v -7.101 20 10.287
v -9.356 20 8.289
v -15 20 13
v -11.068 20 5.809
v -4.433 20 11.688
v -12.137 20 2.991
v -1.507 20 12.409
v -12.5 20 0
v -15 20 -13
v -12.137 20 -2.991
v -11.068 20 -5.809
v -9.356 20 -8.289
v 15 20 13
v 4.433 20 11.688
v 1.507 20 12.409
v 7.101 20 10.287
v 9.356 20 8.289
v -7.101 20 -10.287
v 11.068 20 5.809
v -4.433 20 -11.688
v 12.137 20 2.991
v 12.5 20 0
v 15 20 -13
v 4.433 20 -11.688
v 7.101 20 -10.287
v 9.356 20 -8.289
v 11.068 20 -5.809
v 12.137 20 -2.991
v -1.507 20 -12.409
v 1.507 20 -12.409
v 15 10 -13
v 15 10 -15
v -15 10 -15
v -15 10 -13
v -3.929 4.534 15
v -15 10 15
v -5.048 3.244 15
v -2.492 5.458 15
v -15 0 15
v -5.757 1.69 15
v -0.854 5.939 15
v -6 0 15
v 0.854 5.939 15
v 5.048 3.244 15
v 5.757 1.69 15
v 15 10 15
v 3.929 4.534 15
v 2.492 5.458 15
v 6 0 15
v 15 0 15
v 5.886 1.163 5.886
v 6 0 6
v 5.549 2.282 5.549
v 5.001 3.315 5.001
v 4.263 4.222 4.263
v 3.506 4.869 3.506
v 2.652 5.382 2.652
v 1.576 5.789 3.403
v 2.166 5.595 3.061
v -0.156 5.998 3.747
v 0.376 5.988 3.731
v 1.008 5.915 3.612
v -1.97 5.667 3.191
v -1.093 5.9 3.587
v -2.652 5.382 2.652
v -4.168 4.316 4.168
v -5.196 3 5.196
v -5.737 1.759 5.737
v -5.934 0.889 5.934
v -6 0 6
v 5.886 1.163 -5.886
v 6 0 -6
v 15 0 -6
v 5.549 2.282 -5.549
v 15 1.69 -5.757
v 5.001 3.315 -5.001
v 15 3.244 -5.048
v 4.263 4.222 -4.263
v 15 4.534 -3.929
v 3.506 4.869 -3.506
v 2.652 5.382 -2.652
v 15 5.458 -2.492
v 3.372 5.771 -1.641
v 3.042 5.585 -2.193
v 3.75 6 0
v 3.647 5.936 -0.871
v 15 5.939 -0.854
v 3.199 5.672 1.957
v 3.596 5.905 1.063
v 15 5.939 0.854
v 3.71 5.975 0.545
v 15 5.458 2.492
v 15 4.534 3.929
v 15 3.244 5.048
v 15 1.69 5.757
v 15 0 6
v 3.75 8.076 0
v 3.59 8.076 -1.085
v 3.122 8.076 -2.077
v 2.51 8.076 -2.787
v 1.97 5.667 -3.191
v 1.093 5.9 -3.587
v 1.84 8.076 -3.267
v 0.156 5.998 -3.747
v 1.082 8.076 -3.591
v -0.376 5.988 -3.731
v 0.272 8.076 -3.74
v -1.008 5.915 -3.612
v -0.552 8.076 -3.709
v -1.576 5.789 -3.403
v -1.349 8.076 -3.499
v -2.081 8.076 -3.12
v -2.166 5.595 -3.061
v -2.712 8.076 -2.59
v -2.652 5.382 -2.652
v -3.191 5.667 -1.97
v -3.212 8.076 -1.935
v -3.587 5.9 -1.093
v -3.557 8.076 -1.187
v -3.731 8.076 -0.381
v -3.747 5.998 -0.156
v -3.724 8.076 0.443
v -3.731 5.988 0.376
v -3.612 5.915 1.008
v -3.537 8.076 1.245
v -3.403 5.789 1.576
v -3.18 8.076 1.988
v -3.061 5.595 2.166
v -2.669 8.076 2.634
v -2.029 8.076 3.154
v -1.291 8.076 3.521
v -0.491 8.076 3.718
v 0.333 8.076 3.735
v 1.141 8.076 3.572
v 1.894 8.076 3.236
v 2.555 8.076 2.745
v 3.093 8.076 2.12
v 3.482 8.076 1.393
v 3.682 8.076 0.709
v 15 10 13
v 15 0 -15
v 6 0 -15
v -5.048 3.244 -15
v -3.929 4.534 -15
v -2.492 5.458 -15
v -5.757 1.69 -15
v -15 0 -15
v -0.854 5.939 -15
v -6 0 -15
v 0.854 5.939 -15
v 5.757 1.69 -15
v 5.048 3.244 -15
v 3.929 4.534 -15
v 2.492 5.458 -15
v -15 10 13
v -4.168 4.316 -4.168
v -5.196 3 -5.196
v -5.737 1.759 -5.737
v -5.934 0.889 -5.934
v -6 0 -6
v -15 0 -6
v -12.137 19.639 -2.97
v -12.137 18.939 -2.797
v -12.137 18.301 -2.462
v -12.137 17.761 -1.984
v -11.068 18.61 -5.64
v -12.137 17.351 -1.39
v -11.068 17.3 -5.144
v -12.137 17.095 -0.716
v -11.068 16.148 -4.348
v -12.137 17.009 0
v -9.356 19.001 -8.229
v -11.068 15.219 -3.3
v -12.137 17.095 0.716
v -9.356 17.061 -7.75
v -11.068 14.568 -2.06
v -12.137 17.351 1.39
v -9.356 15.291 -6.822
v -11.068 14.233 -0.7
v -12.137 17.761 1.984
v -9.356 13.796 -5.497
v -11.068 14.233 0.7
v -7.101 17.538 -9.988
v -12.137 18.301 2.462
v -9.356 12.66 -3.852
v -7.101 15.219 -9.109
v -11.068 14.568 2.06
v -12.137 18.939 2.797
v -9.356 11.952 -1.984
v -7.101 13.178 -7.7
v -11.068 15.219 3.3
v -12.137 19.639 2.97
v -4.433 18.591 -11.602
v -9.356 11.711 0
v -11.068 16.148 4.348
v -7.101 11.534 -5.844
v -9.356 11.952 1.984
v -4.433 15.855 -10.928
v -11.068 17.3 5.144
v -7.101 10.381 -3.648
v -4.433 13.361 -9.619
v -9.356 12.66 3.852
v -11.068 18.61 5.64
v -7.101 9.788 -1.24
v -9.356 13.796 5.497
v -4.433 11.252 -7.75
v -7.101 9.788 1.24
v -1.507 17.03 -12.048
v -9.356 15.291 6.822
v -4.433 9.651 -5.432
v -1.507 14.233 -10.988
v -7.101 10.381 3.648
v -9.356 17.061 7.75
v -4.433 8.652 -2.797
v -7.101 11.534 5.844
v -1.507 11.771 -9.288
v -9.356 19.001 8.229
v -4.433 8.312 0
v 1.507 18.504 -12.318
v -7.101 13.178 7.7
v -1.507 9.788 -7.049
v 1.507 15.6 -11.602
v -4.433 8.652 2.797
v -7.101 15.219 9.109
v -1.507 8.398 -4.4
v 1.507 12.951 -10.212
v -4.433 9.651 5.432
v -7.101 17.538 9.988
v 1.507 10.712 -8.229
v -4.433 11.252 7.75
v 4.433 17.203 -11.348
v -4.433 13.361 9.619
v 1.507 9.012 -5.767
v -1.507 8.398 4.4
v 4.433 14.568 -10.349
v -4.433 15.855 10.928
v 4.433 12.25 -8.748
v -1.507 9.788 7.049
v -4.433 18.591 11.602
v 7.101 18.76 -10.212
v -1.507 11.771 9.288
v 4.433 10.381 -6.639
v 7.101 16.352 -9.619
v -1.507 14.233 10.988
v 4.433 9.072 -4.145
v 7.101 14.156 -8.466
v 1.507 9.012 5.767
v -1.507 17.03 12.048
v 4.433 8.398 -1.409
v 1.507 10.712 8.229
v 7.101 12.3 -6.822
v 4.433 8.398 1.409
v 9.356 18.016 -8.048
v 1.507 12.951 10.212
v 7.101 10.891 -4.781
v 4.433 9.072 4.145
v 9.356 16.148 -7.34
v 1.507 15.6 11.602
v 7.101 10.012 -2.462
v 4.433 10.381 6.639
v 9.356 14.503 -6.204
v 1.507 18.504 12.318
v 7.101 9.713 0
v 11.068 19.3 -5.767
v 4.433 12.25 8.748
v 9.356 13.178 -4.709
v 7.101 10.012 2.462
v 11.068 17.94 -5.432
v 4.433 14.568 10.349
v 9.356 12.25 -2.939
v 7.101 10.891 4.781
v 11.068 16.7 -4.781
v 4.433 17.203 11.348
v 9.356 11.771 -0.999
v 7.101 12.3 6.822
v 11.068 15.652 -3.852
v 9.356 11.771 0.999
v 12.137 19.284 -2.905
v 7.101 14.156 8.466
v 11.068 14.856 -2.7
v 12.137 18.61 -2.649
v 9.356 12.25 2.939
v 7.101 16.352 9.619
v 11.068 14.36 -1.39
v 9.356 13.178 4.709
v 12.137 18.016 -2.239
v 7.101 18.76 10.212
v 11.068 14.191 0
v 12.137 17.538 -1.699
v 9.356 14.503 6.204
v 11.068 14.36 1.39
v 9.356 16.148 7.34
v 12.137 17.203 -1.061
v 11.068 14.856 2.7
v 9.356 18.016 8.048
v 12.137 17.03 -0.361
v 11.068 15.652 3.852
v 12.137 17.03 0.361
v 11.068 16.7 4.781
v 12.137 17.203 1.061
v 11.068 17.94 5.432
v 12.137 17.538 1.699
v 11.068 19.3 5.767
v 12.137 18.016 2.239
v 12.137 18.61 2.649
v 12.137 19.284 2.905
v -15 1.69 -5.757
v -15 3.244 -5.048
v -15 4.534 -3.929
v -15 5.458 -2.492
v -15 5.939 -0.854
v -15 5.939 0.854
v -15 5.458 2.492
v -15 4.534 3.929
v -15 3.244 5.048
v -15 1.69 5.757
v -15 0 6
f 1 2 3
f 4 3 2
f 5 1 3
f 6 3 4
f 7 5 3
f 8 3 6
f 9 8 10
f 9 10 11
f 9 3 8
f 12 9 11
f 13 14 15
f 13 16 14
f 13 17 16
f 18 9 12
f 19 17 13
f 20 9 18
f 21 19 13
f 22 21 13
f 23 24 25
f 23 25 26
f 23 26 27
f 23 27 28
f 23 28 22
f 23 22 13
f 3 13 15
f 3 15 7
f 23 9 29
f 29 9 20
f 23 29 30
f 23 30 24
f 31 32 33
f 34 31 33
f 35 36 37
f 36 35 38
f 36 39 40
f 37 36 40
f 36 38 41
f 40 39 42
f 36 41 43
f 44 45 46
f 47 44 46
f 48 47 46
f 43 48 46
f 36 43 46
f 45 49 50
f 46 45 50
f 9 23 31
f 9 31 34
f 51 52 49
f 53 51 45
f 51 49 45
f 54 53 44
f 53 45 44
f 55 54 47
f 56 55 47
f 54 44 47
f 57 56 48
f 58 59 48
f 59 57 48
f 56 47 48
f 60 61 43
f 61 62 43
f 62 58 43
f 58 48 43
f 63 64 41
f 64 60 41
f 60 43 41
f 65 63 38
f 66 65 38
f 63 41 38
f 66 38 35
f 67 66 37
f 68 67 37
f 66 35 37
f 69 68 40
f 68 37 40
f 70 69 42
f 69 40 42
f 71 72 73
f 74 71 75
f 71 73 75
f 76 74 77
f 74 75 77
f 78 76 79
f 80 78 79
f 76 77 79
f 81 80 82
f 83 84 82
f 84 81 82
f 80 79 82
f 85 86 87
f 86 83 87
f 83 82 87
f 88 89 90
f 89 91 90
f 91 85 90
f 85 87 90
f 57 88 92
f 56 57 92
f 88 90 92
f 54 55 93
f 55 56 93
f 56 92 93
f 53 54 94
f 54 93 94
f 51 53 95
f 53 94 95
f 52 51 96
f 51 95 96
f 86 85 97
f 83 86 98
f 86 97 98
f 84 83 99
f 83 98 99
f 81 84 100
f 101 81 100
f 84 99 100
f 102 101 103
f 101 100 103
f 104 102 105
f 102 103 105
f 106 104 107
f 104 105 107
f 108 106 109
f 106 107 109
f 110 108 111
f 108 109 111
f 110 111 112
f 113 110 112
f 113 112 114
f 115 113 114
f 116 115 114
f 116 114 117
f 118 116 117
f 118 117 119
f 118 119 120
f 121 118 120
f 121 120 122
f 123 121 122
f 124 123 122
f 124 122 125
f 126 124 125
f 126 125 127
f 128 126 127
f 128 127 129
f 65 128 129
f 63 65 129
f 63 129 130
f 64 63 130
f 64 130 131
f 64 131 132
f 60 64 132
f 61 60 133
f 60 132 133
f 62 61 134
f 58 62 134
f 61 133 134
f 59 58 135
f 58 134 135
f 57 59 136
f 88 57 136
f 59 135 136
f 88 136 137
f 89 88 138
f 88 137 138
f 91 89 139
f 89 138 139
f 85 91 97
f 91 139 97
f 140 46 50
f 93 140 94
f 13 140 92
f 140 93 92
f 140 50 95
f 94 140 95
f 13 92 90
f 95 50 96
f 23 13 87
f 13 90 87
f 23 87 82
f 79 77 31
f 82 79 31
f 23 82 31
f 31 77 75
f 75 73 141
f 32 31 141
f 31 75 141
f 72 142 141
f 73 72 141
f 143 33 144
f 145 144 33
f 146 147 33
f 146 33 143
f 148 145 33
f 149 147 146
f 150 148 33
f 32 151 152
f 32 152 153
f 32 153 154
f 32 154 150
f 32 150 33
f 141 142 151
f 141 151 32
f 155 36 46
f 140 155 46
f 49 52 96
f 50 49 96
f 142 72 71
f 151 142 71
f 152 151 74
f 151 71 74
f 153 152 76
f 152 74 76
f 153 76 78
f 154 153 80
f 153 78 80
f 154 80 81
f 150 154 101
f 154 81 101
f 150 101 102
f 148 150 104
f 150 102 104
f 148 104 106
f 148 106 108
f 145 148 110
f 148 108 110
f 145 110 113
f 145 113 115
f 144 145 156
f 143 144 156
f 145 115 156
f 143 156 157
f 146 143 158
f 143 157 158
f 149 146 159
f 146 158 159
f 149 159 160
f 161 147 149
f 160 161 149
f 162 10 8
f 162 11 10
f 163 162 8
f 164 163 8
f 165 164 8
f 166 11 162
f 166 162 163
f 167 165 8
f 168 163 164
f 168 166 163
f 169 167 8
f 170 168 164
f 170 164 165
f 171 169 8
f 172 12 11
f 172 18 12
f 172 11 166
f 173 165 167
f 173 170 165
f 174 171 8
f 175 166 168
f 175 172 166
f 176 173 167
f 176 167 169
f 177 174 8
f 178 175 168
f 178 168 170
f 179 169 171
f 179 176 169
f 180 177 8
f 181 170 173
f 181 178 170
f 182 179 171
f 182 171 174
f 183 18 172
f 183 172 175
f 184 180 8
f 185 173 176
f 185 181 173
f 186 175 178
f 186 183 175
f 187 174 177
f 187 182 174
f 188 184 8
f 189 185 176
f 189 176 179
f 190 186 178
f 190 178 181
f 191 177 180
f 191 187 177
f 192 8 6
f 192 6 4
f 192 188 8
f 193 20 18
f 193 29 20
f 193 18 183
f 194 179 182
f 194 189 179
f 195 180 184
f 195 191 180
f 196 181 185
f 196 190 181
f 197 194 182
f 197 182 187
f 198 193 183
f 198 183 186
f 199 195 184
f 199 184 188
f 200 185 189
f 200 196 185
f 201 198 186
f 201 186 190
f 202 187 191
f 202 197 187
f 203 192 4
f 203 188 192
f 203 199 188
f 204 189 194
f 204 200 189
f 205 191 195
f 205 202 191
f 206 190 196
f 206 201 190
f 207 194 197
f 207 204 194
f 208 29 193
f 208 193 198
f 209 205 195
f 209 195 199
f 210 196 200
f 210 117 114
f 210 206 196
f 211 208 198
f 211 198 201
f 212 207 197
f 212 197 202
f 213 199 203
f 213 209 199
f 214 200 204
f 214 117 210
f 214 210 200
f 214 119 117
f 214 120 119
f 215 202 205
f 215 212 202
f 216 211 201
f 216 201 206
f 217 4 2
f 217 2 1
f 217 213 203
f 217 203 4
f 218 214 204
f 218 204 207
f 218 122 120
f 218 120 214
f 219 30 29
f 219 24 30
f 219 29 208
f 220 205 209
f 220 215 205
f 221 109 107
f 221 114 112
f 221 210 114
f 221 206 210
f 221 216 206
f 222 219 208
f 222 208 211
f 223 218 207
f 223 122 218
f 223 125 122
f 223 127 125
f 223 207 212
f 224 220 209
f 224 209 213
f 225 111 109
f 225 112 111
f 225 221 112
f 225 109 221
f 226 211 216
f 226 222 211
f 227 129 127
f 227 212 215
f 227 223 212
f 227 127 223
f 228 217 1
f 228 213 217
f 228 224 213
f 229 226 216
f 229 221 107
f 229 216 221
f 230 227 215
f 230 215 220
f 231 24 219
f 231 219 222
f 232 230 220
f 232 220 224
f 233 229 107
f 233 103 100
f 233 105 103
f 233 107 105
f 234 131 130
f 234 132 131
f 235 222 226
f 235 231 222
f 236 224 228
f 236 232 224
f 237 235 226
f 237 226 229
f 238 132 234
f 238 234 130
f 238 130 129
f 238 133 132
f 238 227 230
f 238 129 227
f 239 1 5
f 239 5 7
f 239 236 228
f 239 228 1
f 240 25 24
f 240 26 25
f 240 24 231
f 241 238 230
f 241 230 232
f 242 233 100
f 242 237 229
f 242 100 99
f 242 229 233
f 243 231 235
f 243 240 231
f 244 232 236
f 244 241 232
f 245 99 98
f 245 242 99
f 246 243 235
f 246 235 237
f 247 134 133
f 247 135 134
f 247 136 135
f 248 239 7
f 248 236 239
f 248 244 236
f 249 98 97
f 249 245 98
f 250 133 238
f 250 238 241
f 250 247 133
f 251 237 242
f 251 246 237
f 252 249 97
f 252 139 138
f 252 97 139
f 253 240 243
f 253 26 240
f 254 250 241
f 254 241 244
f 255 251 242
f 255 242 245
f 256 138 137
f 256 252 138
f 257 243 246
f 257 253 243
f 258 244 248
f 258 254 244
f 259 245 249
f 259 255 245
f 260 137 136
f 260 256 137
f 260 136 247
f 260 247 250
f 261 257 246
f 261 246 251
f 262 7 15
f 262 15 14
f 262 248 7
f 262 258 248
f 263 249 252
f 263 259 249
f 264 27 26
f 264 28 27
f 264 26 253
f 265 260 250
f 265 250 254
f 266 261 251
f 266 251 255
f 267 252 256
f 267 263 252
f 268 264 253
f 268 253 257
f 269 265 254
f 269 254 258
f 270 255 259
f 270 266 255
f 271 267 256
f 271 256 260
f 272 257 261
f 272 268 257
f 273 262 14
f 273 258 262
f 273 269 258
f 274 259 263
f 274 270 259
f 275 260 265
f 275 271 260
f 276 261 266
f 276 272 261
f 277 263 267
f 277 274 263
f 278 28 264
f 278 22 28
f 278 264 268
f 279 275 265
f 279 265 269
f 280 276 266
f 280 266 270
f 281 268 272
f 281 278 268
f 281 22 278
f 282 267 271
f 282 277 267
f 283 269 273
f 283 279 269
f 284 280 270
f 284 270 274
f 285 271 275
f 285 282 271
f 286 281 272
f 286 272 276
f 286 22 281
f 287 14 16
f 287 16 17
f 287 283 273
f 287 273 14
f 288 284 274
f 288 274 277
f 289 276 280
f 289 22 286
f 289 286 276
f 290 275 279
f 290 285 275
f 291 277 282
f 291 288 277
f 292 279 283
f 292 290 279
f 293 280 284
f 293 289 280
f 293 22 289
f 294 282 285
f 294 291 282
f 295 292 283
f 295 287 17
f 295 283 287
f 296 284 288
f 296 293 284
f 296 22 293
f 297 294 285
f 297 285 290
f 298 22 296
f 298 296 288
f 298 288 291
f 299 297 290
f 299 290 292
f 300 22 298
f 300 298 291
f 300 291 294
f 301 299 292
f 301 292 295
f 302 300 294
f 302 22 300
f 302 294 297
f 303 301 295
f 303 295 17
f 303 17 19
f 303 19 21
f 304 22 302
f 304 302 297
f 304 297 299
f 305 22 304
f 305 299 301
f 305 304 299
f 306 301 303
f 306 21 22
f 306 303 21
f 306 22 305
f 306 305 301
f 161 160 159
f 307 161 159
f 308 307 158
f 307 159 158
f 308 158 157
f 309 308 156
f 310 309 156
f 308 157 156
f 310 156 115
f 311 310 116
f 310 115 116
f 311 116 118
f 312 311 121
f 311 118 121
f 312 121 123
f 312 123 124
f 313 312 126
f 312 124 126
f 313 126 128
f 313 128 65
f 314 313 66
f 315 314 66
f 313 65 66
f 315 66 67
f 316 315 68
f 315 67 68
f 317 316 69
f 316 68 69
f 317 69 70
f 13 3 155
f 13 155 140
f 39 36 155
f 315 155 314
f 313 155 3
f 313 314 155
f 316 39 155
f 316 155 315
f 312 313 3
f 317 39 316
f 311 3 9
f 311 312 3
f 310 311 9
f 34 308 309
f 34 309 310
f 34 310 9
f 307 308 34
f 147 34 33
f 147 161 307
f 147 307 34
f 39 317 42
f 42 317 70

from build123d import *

# Parameters (mm, degrees)
SKETCH2_W               = 30
SKETCH2_H               = 30
BOSS_EXTRUDE1_DEPTH     = 20
SKETCH3_R               = 6
CUT_EXTRUDE2_DEPTH      = 1
CUT_EXTRUDE2_DEPTH_BACK = 31
SKETCH4_R               = 6
CUT_EXTRUDE3_DEPTH      = 1
CUT_EXTRUDE3_DEPTH_BACK = 31
SKETCH7_R               = 3.75
CUT_EXTRUDE4_DEPTH      = 21
SKETCH8_W               = 30
SKETCH8_H               = 10
CUT_EXTRUDE6_DEPTH      = 2
SKETCH9_W               = 30
SKETCH9_H               = 10
CUT_EXTRUDE7_DEPTH      = 2


with BuildPart() as part:
    # Sketch2 → Boss-Extrude1 (new body)
    with BuildSketch(Plane(origin=(0, 0, 0), x_dir=(1, 0, 0), z_dir=(0, 1, 0))):
        Rectangle(SKETCH2_W, SKETCH2_H)
    extrude(amount=BOSS_EXTRUDE1_DEPTH)

    # Sketch3 → Cut-Extrude2 (cut, two sides)
    with BuildSketch(Plane.XY.offset(15)) as cut_extrude2_sk:
        Circle(SKETCH3_R)
    extrude(amount=CUT_EXTRUDE2_DEPTH, mode=Mode.SUBTRACT)
    extrude(cut_extrude2_sk.sketch, amount=-CUT_EXTRUDE2_DEPTH_BACK, mode=Mode.SUBTRACT)

    # Sketch4 → Cut-Extrude3 (cut, two sides)
    with BuildSketch(Plane(origin=(15, 0, 0), x_dir=(0, 0, -1), z_dir=(1, 0, 0))) as cut_extrude3_sk:
        Circle(SKETCH4_R)
    extrude(amount=CUT_EXTRUDE3_DEPTH, mode=Mode.SUBTRACT)
    extrude(cut_extrude3_sk.sketch, amount=-CUT_EXTRUDE3_DEPTH_BACK, mode=Mode.SUBTRACT)

    # Sketch5 → Cut-Revolve1 (revolve, cut)
    with BuildSketch(Plane(origin=(0, 20, 0), x_dir=(1, 0, 0), z_dir=(0, 1, 0))):
        with BuildLine():
            Line((12.5, 0), (-12.5, 0))
            ThreePointArc((-12.5, 0), (0, 12.5), (12.5, 0))
        make_face()
    revolve(axis=Axis((12.5, 20, 0), (-1, 0, 0)), mode=Mode.SUBTRACT)

    # Sketch7 → Cut-Extrude4 (cut, through all)
    with BuildSketch(Plane(origin=(0, 20, 0), x_dir=(1, 0, 0), z_dir=(0, 1, 0))):
        Circle(SKETCH7_R)
    extrude(amount=-CUT_EXTRUDE4_DEPTH, mode=Mode.SUBTRACT)

    # Sketch8 → Cut-Extrude6 (cut)
    with BuildSketch(Plane.XY.offset(15)):
        with Locations((0, 15)):
            Rectangle(SKETCH8_W, SKETCH8_H)
    extrude(amount=-CUT_EXTRUDE6_DEPTH, mode=Mode.SUBTRACT)

    # Sketch9 → Cut-Extrude7 (cut)
    with BuildSketch(Plane(origin=(0, 0, -15), x_dir=(-1, 0, 0), z_dir=(0, 0, -1))):
        with Locations((0, 15)):
            Rectangle(SKETCH9_W, SKETCH9_H)
    extrude(amount=-CUT_EXTRUDE7_DEPTH, mode=Mode.SUBTRACT)


solid = part.part
